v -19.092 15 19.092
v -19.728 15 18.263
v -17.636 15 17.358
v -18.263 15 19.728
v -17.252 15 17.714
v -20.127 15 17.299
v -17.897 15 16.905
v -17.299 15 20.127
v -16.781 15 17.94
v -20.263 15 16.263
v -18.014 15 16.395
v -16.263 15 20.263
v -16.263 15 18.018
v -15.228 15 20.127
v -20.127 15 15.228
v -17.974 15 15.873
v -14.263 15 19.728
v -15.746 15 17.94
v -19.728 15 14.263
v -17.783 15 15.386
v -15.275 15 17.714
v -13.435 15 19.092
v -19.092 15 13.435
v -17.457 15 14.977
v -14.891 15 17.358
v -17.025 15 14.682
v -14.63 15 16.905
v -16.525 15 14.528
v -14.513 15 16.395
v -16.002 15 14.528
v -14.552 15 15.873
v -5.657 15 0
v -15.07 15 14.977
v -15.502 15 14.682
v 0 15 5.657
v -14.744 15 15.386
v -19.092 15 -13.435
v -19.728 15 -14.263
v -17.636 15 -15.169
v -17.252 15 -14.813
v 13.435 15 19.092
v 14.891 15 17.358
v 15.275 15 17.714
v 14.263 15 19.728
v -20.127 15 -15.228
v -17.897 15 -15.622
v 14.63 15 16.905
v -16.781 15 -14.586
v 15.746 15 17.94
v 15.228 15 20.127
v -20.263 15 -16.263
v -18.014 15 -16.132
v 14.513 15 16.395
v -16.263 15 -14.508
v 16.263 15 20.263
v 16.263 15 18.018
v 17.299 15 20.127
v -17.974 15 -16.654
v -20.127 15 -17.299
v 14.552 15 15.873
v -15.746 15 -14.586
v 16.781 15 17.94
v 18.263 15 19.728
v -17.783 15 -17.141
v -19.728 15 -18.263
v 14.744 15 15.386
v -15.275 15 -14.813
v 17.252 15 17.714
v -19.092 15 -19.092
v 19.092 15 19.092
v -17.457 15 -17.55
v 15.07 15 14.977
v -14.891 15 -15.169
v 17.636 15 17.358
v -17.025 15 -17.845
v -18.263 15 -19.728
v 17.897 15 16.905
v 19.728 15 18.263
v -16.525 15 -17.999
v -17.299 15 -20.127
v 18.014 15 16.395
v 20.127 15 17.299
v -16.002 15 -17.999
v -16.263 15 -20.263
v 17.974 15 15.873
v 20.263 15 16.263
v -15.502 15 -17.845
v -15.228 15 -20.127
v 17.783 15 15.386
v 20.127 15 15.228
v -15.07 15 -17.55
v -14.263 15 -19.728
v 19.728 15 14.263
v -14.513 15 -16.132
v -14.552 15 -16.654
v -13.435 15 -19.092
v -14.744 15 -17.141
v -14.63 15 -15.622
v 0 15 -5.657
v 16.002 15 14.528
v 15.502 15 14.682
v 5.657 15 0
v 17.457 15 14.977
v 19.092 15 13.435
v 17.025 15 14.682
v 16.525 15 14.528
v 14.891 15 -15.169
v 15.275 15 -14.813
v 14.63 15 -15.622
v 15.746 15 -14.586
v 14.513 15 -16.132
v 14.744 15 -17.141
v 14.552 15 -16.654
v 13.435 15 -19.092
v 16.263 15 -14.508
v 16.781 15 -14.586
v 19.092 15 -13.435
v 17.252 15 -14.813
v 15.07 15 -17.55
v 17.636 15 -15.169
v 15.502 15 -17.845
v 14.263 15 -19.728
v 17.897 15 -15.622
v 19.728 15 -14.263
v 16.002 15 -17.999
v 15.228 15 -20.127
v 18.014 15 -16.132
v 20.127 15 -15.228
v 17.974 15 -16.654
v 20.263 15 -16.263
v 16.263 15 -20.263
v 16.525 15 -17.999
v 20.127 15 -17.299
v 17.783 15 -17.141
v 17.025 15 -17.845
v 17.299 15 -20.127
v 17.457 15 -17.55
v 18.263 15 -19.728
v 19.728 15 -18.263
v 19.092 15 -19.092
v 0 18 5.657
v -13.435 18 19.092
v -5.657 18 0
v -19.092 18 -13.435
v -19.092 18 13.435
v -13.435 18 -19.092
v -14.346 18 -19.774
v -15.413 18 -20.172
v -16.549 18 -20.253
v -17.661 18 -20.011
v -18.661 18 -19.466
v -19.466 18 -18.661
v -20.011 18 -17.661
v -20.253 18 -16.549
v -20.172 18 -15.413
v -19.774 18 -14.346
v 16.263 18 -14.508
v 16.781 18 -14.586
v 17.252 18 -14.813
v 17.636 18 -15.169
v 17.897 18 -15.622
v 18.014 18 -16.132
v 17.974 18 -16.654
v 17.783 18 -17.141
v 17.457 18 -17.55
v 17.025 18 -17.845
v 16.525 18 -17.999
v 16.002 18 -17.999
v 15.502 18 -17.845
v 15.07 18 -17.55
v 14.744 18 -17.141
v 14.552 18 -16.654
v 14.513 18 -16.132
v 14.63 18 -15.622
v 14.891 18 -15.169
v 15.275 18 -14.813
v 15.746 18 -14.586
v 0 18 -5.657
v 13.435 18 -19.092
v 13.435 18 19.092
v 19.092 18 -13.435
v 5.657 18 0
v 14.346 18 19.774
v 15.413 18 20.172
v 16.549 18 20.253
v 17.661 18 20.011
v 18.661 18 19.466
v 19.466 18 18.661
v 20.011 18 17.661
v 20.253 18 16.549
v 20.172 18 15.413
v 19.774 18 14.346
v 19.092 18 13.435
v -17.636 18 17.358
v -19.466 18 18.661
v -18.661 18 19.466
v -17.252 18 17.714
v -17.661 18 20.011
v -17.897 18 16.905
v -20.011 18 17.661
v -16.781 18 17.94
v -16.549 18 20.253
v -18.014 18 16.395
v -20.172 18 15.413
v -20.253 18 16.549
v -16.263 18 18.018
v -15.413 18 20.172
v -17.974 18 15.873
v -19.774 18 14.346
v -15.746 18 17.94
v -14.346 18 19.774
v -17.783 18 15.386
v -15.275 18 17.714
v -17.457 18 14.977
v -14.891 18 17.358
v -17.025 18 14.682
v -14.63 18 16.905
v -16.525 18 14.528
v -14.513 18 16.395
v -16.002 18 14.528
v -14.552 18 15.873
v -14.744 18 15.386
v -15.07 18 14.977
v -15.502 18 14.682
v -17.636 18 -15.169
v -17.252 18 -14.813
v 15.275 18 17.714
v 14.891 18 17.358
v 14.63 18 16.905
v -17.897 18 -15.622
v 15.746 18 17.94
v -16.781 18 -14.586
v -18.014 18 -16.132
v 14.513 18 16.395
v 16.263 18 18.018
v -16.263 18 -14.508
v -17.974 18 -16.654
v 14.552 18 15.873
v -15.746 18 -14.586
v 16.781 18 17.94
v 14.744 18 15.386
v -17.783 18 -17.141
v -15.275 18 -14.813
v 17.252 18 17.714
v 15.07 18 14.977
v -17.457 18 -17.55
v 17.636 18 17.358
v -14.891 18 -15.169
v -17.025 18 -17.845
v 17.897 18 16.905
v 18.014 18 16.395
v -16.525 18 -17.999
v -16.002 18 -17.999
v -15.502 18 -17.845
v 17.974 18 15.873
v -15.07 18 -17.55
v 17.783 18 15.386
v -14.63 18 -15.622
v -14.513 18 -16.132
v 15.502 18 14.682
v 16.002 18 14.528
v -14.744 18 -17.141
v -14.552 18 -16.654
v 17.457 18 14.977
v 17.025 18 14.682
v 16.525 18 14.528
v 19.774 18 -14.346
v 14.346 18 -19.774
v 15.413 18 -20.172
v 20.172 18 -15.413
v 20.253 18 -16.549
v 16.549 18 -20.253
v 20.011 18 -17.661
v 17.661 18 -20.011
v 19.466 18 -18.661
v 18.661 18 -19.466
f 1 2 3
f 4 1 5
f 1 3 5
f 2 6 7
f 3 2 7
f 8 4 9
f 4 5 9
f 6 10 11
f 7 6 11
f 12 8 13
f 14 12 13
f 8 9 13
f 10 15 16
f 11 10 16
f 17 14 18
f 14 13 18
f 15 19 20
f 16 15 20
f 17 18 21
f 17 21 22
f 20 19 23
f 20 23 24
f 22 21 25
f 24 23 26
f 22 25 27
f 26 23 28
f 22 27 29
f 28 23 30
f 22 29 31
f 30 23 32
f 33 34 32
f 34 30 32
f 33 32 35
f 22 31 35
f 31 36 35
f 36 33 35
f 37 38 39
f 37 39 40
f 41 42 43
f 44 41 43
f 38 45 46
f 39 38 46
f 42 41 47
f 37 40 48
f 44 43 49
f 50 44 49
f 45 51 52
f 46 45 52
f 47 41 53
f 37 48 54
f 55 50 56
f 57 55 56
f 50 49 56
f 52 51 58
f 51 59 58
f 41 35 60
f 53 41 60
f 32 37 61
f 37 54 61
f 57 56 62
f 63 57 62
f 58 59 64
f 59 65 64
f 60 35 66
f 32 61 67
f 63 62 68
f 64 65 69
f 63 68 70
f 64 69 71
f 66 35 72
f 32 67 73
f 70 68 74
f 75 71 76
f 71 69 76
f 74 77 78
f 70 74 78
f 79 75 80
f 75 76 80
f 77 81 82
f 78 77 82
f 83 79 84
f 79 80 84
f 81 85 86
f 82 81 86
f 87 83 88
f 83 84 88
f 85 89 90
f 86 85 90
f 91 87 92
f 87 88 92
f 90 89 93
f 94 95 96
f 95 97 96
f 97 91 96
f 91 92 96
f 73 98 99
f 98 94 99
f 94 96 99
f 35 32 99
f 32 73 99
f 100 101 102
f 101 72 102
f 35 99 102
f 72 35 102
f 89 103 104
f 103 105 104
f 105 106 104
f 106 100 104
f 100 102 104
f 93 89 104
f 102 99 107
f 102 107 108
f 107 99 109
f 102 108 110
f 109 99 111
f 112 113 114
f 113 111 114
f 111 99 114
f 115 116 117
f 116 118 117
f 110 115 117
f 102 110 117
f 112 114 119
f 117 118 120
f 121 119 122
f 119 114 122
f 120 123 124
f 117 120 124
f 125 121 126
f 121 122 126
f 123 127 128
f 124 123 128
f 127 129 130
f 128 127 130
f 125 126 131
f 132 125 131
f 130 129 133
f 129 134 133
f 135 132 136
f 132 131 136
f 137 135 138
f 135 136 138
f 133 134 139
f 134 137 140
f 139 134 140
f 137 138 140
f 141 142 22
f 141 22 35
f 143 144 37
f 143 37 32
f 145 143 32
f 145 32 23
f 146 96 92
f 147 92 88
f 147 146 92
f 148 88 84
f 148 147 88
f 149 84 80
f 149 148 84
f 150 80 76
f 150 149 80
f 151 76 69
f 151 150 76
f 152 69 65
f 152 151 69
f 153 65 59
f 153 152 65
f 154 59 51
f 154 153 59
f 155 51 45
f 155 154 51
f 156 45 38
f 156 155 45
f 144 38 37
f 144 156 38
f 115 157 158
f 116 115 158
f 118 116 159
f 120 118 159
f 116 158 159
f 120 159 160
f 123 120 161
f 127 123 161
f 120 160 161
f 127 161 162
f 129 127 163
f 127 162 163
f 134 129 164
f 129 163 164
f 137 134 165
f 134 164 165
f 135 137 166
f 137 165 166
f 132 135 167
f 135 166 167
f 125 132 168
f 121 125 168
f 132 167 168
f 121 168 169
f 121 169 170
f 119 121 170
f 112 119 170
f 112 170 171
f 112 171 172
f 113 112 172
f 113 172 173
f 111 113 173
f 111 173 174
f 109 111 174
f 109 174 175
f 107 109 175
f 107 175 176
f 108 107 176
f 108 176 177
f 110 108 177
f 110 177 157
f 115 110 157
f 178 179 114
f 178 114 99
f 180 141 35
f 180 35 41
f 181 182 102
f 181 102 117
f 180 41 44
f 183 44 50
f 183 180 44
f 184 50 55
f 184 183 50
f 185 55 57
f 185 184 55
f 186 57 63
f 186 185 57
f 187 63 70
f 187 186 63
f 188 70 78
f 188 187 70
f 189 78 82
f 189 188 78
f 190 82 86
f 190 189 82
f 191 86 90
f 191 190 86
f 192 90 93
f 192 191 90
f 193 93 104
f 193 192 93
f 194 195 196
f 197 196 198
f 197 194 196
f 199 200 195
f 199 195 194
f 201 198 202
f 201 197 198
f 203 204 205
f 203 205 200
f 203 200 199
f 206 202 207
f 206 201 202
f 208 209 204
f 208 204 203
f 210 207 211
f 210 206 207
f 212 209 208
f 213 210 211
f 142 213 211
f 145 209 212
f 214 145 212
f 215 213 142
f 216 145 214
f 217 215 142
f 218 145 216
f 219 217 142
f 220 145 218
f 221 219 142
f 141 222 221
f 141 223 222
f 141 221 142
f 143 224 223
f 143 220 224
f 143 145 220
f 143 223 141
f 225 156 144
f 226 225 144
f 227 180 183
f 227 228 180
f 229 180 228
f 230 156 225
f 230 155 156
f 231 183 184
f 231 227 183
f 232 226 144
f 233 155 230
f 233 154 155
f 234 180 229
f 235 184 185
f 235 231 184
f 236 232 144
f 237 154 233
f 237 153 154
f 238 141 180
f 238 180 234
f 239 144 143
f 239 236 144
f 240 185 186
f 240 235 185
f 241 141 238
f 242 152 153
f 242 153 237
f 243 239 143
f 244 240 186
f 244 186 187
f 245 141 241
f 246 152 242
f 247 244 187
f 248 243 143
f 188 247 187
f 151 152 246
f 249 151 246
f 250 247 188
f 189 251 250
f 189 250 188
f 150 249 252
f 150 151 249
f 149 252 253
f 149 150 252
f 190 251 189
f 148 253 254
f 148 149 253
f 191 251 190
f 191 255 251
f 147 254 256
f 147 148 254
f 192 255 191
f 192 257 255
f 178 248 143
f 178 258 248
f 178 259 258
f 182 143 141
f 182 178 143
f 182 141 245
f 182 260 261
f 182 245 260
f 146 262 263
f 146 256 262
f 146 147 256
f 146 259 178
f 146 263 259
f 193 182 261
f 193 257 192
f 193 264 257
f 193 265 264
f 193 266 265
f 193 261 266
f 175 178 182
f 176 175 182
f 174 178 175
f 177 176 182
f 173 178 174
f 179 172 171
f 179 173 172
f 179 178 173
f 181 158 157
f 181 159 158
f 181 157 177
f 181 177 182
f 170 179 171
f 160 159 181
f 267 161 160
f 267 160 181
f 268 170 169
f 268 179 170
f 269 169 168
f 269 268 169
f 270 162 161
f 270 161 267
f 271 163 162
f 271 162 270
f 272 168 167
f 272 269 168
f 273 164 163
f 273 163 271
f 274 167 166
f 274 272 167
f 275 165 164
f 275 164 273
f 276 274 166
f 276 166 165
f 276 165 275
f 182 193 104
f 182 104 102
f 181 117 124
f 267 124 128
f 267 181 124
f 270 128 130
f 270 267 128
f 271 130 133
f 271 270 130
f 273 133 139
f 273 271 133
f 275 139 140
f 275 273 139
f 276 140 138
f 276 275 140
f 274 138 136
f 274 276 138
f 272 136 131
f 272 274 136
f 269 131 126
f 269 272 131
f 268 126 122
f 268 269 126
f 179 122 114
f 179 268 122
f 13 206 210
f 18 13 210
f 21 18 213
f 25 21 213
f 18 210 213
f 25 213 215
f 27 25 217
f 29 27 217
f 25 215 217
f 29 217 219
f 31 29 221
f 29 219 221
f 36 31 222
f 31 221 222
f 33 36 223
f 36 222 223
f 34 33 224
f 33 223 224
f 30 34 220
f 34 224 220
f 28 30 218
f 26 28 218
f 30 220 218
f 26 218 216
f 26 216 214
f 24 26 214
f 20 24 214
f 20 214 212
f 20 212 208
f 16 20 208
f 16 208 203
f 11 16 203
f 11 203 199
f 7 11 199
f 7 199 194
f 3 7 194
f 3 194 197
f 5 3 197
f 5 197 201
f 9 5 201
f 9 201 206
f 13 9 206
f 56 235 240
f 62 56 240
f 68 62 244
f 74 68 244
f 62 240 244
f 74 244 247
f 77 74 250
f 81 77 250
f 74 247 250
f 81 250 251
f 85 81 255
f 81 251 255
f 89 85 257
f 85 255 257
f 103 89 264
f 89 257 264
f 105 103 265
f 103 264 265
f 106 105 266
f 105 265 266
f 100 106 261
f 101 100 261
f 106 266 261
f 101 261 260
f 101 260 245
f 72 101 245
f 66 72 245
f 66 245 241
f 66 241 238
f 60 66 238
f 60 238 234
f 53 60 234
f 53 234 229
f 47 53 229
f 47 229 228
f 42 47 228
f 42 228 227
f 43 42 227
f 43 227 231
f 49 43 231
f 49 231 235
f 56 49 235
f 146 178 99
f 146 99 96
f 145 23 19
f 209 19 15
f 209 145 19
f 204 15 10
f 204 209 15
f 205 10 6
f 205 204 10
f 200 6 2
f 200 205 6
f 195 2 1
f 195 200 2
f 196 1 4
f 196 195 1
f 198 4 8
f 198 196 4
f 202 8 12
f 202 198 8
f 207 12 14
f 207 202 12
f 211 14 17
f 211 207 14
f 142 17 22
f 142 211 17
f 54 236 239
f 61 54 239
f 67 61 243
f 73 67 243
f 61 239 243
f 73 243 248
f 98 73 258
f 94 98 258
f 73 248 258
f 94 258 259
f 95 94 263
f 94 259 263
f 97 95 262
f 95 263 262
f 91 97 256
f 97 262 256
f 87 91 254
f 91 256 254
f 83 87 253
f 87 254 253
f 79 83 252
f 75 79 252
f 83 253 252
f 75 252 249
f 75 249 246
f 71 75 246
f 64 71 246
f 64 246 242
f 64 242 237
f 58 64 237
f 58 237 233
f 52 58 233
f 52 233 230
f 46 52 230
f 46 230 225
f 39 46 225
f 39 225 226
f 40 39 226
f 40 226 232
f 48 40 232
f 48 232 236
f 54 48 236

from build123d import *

# Parameters (mm, degrees)
SKETCH1_R                = 11.9
SKETCH1_R_2              = 9.9
BOSS_EXTRUDE3_DEPTH      = 15
SKETCH4_R                = 9.9
BOSS_EXTRUDE4_DEPTH      = 5.1
BOSS_EXTRUDE8_START      = -3
SKETCH12_R               = 19
SKETCH12_R_2             = 11.9
BOSS_EXTRUDE8_DEPTH      = 3
SKETCH14_R               = 1.755
CUT_EXTRUDE4_DEPTH       = 3
CUT_EXTRUDE5_DEPTH       = 25
CUT_EXTRUDE5_DEPTH_BACK  = 20
SKETCH15_W               = 38
SKETCH15_H               = 16.079993569
BOSS_EXTRUDE9_START      = -3
SKETCH16_R               = 9.9
BOSS_EXTRUDE9_DEPTH      = 3
BOSS_EXTRUDE10_START     = -3
SKETCH17_W               = 40
SKETCH17_H               = 40
SKETCH17_R               = 19
BOSS_EXTRUDE10_DEPTH     = 3
SKETCH20_W               = 60
SKETCH20_H               = 60
SKETCH20_W_2             = 40
SKETCH20_H_2             = 40
BOSS_EXTRUDE11_DEPTH     = 3
SKETCH21_R               = 1.755
CUT_EXTRUDE7_DEPTH       = 3
SKETCH23_W               = 60
SKETCH23_H               = 60
CUT_EXTRUDE9_DEPTH       = 3
BOSS_EXTRUDE12_START     = 3
SKETCH24_R               = 1.755
BOSS_EXTRUDE12_DEPTH     = 3
CUT_EXTRUDE10_DEPTH      = 16
CUT_EXTRUDE10_DEPTH_BACK = 42
SKETCH25_W               = 54.545590819
SKETCH25_H               = 6.512587561


with BuildPart() as part:
    # Sketch1 → Boss-Extrude3 (new body)
    with BuildSketch(Plane(origin=(0, 0, 0), x_dir=(1, 0, 0), z_dir=(0, 1, 0))):
        with Locations(Location((0, 0, 0), (0, 0, 270))):
            Circle(SKETCH1_R)
        with Locations(Location((0, 0, 0), (0, 0, 270))):
            Circle(SKETCH1_R_2, mode=Mode.SUBTRACT)
    extrude(amount=BOSS_EXTRUDE3_DEPTH)

    # Sketch4 → Boss-Extrude4 (add)
    with BuildSketch(Plane.XZ):
        with Locations(Location((0, 0, 0), (0, 0, 270))):
            Circle(SKETCH4_R)
    extrude(amount=-BOSS_EXTRUDE4_DEPTH)

    # Sketch7 → Cut-Revolve2 (revolve, cut)
    with BuildSketch(Plane(origin=(0, 0, 0), x_dir=(0, 0, -1), z_dir=(1, 0, 0))):
        with BuildLine():
            Line((0, 15), (0, -4.8))
            ThreePointArc((0, -4.8), (9.9, 5.1), (0, 15))
        make_face()
    revolve(axis=Axis((0, 15, 0), (0, -1, 0)), mode=Mode.SUBTRACT)

    # Sketch12 → Boss-Extrude8 (add)
    with BuildSketch(Plane(origin=(0, 15, 0), x_dir=(1, 0, 0), z_dir=(0, 1, 0)).offset(BOSS_EXTRUDE8_START)):
        with Locations(Location((0, 0, 0), (0, 0, 270))):
            Circle(SKETCH12_R)
        with Locations(Location((0, 0, 0), (0, 0, 270))):
            Circle(SKETCH12_R_2, mode=Mode.SUBTRACT)
    extrude(amount=BOSS_EXTRUDE8_DEPTH)

    # Sketch14 → Cut-Extrude4 (cut)
    with BuildSketch(Plane(origin=(0, 15, 0), x_dir=(1, 0, 0), z_dir=(0, 1, 0))):
        with Locations(Location((0, 15.15, 0), (0, 0, 270))):
            Circle(SKETCH14_R)
        with Locations(Location((-15.15, 0, 0), (0, 0, 270))):
            Circle(SKETCH14_R)
        with Locations(Location((0, -15.15, 0), (0, 0, 270))):
            Circle(SKETCH14_R)
        with Locations(Location((15.15, 0, 0), (0, 0, 270))):
            Circle(SKETCH14_R)
    extrude(amount=-CUT_EXTRUDE4_DEPTH, mode=Mode.SUBTRACT)

    # Sketch15 → Cut-Extrude5 (cut, two sides: drawn at the far end of the back side and taken through both)
    with BuildSketch(Plane(origin=(0, 0, 0), x_dir=(0, 0, -1), z_dir=(1, 0, 0)).offset(-CUT_EXTRUDE5_DEPTH_BACK)):
        with Locations((0, 3.960003216)):
            Rectangle(SKETCH15_W, SKETCH15_H)
    extrude(amount=CUT_EXTRUDE5_DEPTH + CUT_EXTRUDE5_DEPTH_BACK, mode=Mode.SUBTRACT)

    # Sketch16 → Boss-Extrude9 (add)
    with BuildSketch(Plane(origin=(0, 15, 0), x_dir=(1, 0, 0), z_dir=(0, 1, 0)).offset(BOSS_EXTRUDE9_START)):
        Circle(SKETCH16_R)
    extrude(amount=BOSS_EXTRUDE9_DEPTH)

    # Sketch17 → Boss-Extrude10 (add)
    with BuildSketch(Plane(origin=(0, 15, 0), x_dir=(1, 0, 0), z_dir=(0, 1, 0)).offset(BOSS_EXTRUDE10_START)):
        Rectangle(SKETCH17_W, SKETCH17_H)
        Circle(SKETCH17_R, mode=Mode.SUBTRACT)
    extrude(amount=BOSS_EXTRUDE10_DEPTH)

    # Sketch20 → Boss-Extrude11 (add)
    with BuildSketch(Plane(origin=(0, 15, 0), x_dir=(1, 0, 0), z_dir=(0, 1, 0))):
        Rectangle(SKETCH20_W, SKETCH20_H)
        Rectangle(SKETCH20_W_2, SKETCH20_H_2, mode=Mode.SUBTRACT)
    extrude(amount=-BOSS_EXTRUDE11_DEPTH)

    # Sketch21 → Cut-Extrude7 (cut)
    with BuildSketch(Plane(origin=(0, 15, 0), x_dir=(1, 0, 0), z_dir=(0, 1, 0))):
        with Locations(Location((-16.263455967, 16.263455967, 0), (0, 0, 270))):
            Circle(SKETCH21_R)
        with Locations(Location((-16.263455967, -16.263455967, 0), (0, 0, 270))):
            Circle(SKETCH21_R)
        with Locations(Location((16.263455967, 16.263455967, 0), (0, 0, 270))):
            Circle(SKETCH21_R)
        with Locations(Location((16.263455967, -16.263455967, 0), (0, 0, 270))):
            Circle(SKETCH21_R)
    extrude(amount=-CUT_EXTRUDE7_DEPTH, mode=Mode.SUBTRACT)

    # Sketch23 → Cut-Extrude9 (cut)
    with BuildSketch(Plane(origin=(0, 15, 0), x_dir=(1, 0, 0), z_dir=(0, 1, 0))):
        Rectangle(SKETCH23_W, SKETCH23_H)
        with BuildLine():
            Line((-20.263455967, -16.263455967), (-20.263455967, 16.263455967))
            ThreePointArc((-20.263455967, 16.263455967), (-19.091883092, 19.091883092), (-16.263455967, 20.263455967))
            Line((-16.263455967, 20.263455967), (16.263455967, 20.263455967))
            ThreePointArc((16.263455967, 20.263455967), (19.091883092, 19.091883092), (20.263455967, 16.263455967))
            Line((20.263455967, 16.263455967), (20.263455967, -16.263455967))
            ThreePointArc((20.263455967, -16.263455967), (19.091883092, -19.091883092), (16.263455967, -20.263455967))
            Line((16.263455967, -20.263455967), (-16.263455967, -20.263455967))
            ThreePointArc((-16.263455967, -20.263455967), (-19.091883092, -19.091883092), (-20.263455967, -16.263455967))
        make_face(mode=Mode.SUBTRACT)
    extrude(amount=-CUT_EXTRUDE9_DEPTH, mode=Mode.SUBTRACT)

    # Sketch24 → Boss-Extrude12 (add)
    with BuildSketch(Plane(origin=(0, 15, 0), x_dir=(1, 0, 0), z_dir=(0, 1, 0)).offset(BOSS_EXTRUDE12_START)):
        with BuildLine():
            Line((-19.091883092, 13.435028843), (-5.656854249, 0))
            Line((-5.656854249, 0), (-19.091883092, -13.435028843))
            ThreePointArc((-19.091883092, -13.435028843), (-19.091883092, -19.091883092), (-13.435028843, -19.091883092))
            Line((-13.435028843, -19.091883092), (0, -5.656854249))
            Line((0, -5.656854249), (13.435028843, -19.091883092))
            ThreePointArc((13.435028843, -19.091883092), (19.091883092, -19.091883092), (19.091883092, -13.435028843))
            Line((19.091883092, -13.435028843), (5.656854249, 0))
            Line((5.656854249, 0), (19.091883092, 13.435028843))
            ThreePointArc((19.091883092, 13.435028843), (19.091883092, 19.091883092), (13.435028843, 19.091883092))
            Line((13.435028843, 19.091883092), (0, 5.656854249))
            Line((0, 5.656854249), (-13.435028843, 19.091883092))
            ThreePointArc((-13.435028843, 19.091883092), (-19.091883092, 19.091883092), (-19.091883092, 13.435028843))
        make_face()
        with Locations(Location((-16.263455967, 16.263455967, 0), (0, 0, 270))):
            Circle(SKETCH24_R, mode=Mode.SUBTRACT)
        with Locations(Location((16.263455967, 16.263455967, 0), (0, 0, 270))):
            Circle(SKETCH24_R, mode=Mode.SUBTRACT)
        with Locations(Location((16.263455967, -16.263455967, 0), (0, 0, 270))):
            Circle(SKETCH24_R, mode=Mode.SUBTRACT)
        with Locations(Location((-16.263455967, -16.263455967, 0), (0, 0, 270))):
            Circle(SKETCH24_R, mode=Mode.SUBTRACT)
    extrude(amount=-BOSS_EXTRUDE12_DEPTH)

    # Sketch25 → Cut-Extrude10 (cut, two sides: drawn at the far end of the back side and taken through both)
    with BuildSketch(Plane.XY.offset(20.263455967).offset(-CUT_EXTRUDE10_DEPTH_BACK)):
        with Locations((4.016045733, 11.74370622)):
            Rectangle(SKETCH25_W, SKETCH25_H)
    extrude(amount=CUT_EXTRUDE10_DEPTH + CUT_EXTRUDE10_DEPTH_BACK, mode=Mode.SUBTRACT)


solid = part.part
